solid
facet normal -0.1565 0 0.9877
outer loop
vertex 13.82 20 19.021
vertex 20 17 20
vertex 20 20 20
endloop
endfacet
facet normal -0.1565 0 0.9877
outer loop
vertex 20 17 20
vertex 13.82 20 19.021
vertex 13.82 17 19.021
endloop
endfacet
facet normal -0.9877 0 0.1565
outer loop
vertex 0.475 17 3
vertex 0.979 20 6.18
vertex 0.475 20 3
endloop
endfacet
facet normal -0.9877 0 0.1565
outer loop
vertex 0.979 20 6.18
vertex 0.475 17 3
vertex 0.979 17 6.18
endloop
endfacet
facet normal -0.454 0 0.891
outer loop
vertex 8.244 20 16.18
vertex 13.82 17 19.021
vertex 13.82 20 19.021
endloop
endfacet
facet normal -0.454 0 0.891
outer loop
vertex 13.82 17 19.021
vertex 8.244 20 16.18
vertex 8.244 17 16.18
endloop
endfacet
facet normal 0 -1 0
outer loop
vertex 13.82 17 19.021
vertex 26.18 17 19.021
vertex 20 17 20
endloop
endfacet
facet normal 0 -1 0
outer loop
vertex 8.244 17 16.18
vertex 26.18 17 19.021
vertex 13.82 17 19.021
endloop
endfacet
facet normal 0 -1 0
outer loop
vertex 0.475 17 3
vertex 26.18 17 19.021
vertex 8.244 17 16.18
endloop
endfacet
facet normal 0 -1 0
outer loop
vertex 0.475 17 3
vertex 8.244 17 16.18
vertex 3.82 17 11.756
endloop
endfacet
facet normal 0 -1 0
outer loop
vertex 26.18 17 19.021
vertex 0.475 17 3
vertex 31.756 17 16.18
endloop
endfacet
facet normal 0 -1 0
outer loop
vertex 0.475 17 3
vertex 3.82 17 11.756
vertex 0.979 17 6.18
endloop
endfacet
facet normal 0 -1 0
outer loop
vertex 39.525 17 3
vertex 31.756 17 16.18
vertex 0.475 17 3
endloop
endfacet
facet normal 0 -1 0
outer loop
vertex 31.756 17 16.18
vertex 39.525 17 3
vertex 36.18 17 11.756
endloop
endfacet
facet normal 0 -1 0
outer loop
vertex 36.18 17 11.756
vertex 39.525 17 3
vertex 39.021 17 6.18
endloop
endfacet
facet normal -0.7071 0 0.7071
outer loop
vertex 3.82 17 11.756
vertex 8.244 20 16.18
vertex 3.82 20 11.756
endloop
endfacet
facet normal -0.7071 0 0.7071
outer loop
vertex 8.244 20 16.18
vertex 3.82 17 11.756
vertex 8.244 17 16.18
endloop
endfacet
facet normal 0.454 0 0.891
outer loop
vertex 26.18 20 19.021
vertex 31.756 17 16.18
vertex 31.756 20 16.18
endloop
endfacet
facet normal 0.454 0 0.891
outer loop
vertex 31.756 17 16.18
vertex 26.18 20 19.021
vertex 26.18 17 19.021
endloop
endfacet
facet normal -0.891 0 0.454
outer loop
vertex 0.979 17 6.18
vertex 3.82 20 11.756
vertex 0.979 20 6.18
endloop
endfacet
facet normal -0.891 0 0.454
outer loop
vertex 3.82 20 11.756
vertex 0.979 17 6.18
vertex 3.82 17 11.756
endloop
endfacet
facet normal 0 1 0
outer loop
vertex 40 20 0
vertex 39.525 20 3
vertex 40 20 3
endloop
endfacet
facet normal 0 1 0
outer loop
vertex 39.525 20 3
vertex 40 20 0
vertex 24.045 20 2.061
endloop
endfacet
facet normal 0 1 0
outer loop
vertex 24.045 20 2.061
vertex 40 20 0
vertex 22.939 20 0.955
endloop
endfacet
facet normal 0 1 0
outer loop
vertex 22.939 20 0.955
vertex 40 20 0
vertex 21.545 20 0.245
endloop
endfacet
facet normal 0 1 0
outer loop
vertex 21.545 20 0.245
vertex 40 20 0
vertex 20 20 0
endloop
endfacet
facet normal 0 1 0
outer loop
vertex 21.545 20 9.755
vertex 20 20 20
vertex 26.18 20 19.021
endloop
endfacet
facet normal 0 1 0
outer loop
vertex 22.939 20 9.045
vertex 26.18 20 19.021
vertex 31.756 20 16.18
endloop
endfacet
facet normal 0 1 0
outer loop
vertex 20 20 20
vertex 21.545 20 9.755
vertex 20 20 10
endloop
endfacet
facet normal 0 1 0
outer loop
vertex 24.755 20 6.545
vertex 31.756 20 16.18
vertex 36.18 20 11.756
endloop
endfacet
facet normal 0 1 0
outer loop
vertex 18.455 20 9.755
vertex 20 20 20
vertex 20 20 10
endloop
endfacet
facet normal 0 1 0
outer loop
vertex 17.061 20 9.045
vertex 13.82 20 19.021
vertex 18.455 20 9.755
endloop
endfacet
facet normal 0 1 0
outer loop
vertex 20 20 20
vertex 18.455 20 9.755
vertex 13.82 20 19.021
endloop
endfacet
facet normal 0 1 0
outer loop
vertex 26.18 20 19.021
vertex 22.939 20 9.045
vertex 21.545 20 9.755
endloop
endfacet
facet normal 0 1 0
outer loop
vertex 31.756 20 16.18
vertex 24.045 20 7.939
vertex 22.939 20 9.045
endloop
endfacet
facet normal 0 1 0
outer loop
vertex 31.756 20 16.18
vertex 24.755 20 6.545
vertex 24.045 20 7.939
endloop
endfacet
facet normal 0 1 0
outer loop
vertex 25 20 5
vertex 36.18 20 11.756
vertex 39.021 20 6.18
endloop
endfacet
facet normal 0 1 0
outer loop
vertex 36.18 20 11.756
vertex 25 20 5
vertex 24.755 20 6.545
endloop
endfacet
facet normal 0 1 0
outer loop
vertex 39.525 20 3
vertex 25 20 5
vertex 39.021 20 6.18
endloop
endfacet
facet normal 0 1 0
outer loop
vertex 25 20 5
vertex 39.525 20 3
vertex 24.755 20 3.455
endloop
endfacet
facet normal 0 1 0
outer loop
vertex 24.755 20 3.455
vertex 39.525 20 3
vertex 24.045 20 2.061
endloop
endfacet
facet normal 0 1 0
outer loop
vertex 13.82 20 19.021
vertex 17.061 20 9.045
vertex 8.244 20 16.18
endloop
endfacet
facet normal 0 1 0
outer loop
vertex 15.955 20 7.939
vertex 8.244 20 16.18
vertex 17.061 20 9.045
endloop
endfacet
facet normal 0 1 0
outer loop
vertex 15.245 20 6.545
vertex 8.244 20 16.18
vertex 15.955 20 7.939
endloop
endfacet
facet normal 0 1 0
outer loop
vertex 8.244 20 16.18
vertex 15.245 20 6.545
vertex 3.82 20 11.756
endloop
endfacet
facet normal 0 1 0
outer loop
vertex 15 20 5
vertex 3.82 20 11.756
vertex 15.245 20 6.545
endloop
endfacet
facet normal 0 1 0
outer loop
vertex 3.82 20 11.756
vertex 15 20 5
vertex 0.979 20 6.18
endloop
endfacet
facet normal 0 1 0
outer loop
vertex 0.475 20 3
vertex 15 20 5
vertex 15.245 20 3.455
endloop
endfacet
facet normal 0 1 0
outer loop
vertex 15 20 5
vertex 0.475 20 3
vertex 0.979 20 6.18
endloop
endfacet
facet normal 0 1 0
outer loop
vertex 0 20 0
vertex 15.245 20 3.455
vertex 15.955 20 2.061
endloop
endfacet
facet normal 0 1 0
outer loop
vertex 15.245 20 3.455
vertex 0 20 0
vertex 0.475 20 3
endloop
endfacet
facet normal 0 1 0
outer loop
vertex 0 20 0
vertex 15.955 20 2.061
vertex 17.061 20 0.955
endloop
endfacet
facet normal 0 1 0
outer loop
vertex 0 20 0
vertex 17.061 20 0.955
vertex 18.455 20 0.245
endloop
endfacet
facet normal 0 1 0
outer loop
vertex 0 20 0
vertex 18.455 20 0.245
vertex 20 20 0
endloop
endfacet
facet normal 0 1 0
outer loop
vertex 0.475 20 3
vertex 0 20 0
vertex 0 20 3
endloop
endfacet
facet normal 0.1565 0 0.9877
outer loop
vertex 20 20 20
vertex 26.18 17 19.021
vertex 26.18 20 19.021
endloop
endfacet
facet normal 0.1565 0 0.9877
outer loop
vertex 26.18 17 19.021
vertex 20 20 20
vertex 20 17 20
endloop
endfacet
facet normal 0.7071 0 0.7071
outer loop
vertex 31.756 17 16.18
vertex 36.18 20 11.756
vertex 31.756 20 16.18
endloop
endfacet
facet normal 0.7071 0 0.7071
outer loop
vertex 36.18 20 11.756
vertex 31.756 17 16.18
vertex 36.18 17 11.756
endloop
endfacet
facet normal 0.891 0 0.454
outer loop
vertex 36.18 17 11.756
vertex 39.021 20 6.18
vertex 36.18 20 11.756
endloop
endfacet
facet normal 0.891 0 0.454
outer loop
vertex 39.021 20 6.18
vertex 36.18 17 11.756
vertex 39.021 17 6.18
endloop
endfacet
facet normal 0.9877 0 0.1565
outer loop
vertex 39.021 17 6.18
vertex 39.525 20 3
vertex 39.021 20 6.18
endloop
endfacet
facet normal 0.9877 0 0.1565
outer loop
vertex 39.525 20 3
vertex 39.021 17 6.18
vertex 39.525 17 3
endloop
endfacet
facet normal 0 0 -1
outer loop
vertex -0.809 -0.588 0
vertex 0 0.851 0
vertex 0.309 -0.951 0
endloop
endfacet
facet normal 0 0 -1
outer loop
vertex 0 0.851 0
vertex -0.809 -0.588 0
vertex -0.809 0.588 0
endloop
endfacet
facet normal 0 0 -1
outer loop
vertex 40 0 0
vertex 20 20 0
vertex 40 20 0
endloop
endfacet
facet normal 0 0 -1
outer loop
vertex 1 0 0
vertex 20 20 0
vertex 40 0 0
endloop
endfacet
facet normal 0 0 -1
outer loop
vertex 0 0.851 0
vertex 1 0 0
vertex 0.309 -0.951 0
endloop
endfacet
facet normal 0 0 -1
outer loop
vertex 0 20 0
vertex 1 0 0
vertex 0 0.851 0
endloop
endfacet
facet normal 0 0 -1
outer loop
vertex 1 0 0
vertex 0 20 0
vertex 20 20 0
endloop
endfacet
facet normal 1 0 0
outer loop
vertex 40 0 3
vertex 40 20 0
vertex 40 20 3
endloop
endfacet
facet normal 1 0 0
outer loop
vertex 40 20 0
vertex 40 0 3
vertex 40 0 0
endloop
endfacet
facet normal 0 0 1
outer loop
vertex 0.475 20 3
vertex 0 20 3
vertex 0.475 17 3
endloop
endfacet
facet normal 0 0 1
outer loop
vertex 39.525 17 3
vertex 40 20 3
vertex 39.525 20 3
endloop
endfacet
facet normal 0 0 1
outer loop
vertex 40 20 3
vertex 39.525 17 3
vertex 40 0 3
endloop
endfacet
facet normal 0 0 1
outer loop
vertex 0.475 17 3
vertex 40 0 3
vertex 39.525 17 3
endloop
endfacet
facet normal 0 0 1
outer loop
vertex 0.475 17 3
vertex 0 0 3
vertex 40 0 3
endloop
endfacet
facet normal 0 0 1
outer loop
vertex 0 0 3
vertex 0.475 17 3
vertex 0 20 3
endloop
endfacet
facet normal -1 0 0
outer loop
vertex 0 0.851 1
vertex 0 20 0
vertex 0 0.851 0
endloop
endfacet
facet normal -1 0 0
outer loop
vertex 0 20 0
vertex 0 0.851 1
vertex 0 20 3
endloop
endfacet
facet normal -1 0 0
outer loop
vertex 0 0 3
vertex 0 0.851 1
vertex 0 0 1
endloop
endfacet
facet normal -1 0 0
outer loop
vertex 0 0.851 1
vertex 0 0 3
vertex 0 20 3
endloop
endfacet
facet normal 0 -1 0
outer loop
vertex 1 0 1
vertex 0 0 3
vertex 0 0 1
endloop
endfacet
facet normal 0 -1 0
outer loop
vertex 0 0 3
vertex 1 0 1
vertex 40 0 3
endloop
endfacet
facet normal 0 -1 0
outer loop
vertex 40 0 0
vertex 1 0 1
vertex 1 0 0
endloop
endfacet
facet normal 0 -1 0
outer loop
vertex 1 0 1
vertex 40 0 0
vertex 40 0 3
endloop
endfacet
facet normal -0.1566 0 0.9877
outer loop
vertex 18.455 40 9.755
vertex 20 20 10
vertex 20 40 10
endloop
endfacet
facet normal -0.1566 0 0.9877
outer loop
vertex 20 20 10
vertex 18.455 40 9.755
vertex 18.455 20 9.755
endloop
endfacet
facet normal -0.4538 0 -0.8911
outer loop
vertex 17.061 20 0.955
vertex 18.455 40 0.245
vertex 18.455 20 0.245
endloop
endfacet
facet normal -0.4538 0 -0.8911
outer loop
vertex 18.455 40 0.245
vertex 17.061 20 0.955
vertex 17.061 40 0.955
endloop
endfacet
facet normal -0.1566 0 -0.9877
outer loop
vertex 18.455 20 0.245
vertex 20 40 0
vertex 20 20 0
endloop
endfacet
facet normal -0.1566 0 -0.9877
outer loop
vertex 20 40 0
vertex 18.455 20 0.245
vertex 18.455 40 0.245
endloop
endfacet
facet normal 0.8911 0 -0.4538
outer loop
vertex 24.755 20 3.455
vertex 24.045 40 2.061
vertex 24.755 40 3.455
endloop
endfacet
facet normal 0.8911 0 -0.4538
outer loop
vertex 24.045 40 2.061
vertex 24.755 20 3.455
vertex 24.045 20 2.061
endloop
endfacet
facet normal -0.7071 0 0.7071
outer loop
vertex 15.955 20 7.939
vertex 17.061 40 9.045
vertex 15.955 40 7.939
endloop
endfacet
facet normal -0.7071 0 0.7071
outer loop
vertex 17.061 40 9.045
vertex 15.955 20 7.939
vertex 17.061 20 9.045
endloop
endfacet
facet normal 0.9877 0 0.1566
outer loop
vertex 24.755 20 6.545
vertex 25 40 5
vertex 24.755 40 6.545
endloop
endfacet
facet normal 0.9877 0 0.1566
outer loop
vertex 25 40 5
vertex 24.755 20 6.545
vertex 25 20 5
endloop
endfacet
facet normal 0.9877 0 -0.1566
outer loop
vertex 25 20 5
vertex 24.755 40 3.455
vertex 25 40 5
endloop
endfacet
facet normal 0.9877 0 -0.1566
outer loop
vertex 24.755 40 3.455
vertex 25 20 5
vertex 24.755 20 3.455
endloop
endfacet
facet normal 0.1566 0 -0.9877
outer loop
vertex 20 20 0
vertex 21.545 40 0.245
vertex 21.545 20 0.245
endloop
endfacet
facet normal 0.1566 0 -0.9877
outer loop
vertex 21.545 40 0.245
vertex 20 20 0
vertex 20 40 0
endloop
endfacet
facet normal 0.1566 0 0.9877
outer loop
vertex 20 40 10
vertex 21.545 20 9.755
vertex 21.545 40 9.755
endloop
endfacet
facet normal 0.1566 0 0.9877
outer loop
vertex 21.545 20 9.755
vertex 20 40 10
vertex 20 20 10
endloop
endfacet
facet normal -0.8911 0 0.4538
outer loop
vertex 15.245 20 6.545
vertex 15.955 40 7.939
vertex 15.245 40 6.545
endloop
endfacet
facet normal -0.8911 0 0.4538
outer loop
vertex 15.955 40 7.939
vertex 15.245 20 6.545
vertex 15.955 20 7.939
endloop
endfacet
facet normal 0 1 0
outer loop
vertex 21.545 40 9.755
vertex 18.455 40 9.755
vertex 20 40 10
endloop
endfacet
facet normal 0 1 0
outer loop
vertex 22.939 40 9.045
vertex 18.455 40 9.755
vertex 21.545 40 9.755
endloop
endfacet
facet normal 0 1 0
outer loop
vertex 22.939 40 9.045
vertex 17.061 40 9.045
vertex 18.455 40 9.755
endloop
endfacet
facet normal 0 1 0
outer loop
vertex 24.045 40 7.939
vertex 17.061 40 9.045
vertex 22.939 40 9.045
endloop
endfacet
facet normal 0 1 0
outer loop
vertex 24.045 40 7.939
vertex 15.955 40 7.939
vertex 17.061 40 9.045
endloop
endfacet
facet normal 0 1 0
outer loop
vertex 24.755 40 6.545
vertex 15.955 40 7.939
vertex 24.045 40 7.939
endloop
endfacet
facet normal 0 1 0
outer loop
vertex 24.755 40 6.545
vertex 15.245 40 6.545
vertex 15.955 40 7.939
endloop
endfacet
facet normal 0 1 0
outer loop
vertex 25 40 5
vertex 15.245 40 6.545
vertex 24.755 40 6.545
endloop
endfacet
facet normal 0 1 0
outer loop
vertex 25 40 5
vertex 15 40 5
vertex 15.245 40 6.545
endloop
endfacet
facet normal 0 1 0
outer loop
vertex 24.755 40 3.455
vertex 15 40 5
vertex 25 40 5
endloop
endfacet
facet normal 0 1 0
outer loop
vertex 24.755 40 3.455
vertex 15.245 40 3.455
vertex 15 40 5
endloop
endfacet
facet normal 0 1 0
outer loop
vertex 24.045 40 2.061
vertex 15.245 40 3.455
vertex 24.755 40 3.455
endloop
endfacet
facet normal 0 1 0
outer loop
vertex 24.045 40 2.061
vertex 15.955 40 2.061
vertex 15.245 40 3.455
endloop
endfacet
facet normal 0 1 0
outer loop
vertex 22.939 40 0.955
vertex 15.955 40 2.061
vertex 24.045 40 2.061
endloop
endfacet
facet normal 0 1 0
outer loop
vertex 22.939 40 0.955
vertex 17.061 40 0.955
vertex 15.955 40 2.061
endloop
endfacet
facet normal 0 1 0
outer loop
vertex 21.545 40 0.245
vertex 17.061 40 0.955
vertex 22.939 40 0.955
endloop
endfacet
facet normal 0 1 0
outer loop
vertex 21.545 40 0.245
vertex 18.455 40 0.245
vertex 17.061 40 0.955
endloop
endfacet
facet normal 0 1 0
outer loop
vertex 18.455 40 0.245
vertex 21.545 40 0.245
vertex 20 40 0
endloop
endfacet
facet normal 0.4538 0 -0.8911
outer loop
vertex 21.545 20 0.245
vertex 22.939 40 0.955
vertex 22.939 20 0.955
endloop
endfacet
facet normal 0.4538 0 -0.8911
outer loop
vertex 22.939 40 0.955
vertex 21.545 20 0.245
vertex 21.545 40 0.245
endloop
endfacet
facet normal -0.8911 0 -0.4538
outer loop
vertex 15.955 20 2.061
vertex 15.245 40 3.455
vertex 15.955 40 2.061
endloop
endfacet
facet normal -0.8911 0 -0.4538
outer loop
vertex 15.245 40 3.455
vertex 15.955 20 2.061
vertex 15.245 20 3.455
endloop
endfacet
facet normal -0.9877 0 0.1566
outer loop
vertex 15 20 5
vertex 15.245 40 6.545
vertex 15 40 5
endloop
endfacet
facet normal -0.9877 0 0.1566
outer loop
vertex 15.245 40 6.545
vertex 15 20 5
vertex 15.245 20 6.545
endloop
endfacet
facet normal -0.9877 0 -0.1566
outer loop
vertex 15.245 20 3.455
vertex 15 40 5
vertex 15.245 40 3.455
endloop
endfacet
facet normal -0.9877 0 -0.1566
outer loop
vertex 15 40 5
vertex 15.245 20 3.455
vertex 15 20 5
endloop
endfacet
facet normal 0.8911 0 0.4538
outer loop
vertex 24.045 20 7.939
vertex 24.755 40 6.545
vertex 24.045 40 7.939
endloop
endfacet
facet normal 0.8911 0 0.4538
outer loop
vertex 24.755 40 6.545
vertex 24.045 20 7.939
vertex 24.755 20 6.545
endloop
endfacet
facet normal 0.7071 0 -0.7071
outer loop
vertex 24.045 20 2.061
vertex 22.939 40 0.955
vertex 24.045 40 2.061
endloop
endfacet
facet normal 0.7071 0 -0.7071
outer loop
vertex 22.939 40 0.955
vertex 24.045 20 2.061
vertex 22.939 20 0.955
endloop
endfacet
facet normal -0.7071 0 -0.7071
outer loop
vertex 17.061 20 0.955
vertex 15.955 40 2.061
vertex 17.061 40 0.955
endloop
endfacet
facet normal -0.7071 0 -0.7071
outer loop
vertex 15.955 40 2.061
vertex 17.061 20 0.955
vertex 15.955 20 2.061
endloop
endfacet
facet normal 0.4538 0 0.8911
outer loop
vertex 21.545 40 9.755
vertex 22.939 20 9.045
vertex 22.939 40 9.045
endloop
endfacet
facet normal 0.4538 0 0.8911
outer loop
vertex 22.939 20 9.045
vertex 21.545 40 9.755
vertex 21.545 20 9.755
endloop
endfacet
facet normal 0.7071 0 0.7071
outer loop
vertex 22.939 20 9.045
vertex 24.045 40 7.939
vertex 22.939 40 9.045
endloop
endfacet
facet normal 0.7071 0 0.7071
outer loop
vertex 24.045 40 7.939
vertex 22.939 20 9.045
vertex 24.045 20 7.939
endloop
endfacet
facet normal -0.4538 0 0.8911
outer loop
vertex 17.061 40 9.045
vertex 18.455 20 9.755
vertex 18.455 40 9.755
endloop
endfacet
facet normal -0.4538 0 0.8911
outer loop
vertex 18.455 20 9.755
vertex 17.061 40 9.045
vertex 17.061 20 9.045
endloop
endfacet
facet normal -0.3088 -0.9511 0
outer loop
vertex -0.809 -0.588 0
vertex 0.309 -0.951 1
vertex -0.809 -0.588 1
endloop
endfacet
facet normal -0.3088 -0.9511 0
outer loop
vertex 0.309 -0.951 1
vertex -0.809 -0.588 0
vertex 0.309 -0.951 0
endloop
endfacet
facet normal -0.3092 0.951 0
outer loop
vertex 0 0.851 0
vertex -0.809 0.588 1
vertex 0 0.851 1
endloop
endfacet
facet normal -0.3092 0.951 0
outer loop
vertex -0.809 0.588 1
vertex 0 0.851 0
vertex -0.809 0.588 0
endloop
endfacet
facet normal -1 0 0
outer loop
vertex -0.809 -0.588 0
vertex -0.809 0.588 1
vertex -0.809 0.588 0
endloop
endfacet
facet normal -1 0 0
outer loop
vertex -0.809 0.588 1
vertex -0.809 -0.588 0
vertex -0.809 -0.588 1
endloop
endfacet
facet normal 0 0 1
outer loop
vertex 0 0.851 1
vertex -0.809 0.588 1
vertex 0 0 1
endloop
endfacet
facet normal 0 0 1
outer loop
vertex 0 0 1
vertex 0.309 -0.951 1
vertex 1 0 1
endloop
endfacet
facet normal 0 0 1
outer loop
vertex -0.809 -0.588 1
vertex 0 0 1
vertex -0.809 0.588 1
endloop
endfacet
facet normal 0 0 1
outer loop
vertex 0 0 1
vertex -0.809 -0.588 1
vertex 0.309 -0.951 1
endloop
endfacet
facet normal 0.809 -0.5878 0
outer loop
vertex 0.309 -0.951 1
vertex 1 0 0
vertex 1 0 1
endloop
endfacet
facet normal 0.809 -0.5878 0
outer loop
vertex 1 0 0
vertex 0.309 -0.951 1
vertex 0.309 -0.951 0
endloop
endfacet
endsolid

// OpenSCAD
side_plate= 20;
pin_rad=5;
plate_thickness = 3;
pin_length=20;
mount_width = 20;

union() {
    cube([side_plate*2,mount_width,plate_thickness]);
    translate([0,mount_width-plate_thickness,0]) plate();
    translate([side_plate,mount_width,pin_rad]) pin();
    quarter_circle();
}
module plate() {
    difference() {
        translate([side_plate,0,0]) rotate([0,90,90]) cylinder(plate_thickness,side_plate,side_plate,$fn=20);
        translate([0,0,-side_plate]) cube([side_plate*2,plate_thickness,side_plate]);
    }
}

module pin() {
    rotate([0,90,90]) cylinder(pin_length,pin_rad,pin_rad,$fn=20);
}    

module quarter_circle() {
    cylinder([plate_thickness, side_plate, side_plate]);
}
